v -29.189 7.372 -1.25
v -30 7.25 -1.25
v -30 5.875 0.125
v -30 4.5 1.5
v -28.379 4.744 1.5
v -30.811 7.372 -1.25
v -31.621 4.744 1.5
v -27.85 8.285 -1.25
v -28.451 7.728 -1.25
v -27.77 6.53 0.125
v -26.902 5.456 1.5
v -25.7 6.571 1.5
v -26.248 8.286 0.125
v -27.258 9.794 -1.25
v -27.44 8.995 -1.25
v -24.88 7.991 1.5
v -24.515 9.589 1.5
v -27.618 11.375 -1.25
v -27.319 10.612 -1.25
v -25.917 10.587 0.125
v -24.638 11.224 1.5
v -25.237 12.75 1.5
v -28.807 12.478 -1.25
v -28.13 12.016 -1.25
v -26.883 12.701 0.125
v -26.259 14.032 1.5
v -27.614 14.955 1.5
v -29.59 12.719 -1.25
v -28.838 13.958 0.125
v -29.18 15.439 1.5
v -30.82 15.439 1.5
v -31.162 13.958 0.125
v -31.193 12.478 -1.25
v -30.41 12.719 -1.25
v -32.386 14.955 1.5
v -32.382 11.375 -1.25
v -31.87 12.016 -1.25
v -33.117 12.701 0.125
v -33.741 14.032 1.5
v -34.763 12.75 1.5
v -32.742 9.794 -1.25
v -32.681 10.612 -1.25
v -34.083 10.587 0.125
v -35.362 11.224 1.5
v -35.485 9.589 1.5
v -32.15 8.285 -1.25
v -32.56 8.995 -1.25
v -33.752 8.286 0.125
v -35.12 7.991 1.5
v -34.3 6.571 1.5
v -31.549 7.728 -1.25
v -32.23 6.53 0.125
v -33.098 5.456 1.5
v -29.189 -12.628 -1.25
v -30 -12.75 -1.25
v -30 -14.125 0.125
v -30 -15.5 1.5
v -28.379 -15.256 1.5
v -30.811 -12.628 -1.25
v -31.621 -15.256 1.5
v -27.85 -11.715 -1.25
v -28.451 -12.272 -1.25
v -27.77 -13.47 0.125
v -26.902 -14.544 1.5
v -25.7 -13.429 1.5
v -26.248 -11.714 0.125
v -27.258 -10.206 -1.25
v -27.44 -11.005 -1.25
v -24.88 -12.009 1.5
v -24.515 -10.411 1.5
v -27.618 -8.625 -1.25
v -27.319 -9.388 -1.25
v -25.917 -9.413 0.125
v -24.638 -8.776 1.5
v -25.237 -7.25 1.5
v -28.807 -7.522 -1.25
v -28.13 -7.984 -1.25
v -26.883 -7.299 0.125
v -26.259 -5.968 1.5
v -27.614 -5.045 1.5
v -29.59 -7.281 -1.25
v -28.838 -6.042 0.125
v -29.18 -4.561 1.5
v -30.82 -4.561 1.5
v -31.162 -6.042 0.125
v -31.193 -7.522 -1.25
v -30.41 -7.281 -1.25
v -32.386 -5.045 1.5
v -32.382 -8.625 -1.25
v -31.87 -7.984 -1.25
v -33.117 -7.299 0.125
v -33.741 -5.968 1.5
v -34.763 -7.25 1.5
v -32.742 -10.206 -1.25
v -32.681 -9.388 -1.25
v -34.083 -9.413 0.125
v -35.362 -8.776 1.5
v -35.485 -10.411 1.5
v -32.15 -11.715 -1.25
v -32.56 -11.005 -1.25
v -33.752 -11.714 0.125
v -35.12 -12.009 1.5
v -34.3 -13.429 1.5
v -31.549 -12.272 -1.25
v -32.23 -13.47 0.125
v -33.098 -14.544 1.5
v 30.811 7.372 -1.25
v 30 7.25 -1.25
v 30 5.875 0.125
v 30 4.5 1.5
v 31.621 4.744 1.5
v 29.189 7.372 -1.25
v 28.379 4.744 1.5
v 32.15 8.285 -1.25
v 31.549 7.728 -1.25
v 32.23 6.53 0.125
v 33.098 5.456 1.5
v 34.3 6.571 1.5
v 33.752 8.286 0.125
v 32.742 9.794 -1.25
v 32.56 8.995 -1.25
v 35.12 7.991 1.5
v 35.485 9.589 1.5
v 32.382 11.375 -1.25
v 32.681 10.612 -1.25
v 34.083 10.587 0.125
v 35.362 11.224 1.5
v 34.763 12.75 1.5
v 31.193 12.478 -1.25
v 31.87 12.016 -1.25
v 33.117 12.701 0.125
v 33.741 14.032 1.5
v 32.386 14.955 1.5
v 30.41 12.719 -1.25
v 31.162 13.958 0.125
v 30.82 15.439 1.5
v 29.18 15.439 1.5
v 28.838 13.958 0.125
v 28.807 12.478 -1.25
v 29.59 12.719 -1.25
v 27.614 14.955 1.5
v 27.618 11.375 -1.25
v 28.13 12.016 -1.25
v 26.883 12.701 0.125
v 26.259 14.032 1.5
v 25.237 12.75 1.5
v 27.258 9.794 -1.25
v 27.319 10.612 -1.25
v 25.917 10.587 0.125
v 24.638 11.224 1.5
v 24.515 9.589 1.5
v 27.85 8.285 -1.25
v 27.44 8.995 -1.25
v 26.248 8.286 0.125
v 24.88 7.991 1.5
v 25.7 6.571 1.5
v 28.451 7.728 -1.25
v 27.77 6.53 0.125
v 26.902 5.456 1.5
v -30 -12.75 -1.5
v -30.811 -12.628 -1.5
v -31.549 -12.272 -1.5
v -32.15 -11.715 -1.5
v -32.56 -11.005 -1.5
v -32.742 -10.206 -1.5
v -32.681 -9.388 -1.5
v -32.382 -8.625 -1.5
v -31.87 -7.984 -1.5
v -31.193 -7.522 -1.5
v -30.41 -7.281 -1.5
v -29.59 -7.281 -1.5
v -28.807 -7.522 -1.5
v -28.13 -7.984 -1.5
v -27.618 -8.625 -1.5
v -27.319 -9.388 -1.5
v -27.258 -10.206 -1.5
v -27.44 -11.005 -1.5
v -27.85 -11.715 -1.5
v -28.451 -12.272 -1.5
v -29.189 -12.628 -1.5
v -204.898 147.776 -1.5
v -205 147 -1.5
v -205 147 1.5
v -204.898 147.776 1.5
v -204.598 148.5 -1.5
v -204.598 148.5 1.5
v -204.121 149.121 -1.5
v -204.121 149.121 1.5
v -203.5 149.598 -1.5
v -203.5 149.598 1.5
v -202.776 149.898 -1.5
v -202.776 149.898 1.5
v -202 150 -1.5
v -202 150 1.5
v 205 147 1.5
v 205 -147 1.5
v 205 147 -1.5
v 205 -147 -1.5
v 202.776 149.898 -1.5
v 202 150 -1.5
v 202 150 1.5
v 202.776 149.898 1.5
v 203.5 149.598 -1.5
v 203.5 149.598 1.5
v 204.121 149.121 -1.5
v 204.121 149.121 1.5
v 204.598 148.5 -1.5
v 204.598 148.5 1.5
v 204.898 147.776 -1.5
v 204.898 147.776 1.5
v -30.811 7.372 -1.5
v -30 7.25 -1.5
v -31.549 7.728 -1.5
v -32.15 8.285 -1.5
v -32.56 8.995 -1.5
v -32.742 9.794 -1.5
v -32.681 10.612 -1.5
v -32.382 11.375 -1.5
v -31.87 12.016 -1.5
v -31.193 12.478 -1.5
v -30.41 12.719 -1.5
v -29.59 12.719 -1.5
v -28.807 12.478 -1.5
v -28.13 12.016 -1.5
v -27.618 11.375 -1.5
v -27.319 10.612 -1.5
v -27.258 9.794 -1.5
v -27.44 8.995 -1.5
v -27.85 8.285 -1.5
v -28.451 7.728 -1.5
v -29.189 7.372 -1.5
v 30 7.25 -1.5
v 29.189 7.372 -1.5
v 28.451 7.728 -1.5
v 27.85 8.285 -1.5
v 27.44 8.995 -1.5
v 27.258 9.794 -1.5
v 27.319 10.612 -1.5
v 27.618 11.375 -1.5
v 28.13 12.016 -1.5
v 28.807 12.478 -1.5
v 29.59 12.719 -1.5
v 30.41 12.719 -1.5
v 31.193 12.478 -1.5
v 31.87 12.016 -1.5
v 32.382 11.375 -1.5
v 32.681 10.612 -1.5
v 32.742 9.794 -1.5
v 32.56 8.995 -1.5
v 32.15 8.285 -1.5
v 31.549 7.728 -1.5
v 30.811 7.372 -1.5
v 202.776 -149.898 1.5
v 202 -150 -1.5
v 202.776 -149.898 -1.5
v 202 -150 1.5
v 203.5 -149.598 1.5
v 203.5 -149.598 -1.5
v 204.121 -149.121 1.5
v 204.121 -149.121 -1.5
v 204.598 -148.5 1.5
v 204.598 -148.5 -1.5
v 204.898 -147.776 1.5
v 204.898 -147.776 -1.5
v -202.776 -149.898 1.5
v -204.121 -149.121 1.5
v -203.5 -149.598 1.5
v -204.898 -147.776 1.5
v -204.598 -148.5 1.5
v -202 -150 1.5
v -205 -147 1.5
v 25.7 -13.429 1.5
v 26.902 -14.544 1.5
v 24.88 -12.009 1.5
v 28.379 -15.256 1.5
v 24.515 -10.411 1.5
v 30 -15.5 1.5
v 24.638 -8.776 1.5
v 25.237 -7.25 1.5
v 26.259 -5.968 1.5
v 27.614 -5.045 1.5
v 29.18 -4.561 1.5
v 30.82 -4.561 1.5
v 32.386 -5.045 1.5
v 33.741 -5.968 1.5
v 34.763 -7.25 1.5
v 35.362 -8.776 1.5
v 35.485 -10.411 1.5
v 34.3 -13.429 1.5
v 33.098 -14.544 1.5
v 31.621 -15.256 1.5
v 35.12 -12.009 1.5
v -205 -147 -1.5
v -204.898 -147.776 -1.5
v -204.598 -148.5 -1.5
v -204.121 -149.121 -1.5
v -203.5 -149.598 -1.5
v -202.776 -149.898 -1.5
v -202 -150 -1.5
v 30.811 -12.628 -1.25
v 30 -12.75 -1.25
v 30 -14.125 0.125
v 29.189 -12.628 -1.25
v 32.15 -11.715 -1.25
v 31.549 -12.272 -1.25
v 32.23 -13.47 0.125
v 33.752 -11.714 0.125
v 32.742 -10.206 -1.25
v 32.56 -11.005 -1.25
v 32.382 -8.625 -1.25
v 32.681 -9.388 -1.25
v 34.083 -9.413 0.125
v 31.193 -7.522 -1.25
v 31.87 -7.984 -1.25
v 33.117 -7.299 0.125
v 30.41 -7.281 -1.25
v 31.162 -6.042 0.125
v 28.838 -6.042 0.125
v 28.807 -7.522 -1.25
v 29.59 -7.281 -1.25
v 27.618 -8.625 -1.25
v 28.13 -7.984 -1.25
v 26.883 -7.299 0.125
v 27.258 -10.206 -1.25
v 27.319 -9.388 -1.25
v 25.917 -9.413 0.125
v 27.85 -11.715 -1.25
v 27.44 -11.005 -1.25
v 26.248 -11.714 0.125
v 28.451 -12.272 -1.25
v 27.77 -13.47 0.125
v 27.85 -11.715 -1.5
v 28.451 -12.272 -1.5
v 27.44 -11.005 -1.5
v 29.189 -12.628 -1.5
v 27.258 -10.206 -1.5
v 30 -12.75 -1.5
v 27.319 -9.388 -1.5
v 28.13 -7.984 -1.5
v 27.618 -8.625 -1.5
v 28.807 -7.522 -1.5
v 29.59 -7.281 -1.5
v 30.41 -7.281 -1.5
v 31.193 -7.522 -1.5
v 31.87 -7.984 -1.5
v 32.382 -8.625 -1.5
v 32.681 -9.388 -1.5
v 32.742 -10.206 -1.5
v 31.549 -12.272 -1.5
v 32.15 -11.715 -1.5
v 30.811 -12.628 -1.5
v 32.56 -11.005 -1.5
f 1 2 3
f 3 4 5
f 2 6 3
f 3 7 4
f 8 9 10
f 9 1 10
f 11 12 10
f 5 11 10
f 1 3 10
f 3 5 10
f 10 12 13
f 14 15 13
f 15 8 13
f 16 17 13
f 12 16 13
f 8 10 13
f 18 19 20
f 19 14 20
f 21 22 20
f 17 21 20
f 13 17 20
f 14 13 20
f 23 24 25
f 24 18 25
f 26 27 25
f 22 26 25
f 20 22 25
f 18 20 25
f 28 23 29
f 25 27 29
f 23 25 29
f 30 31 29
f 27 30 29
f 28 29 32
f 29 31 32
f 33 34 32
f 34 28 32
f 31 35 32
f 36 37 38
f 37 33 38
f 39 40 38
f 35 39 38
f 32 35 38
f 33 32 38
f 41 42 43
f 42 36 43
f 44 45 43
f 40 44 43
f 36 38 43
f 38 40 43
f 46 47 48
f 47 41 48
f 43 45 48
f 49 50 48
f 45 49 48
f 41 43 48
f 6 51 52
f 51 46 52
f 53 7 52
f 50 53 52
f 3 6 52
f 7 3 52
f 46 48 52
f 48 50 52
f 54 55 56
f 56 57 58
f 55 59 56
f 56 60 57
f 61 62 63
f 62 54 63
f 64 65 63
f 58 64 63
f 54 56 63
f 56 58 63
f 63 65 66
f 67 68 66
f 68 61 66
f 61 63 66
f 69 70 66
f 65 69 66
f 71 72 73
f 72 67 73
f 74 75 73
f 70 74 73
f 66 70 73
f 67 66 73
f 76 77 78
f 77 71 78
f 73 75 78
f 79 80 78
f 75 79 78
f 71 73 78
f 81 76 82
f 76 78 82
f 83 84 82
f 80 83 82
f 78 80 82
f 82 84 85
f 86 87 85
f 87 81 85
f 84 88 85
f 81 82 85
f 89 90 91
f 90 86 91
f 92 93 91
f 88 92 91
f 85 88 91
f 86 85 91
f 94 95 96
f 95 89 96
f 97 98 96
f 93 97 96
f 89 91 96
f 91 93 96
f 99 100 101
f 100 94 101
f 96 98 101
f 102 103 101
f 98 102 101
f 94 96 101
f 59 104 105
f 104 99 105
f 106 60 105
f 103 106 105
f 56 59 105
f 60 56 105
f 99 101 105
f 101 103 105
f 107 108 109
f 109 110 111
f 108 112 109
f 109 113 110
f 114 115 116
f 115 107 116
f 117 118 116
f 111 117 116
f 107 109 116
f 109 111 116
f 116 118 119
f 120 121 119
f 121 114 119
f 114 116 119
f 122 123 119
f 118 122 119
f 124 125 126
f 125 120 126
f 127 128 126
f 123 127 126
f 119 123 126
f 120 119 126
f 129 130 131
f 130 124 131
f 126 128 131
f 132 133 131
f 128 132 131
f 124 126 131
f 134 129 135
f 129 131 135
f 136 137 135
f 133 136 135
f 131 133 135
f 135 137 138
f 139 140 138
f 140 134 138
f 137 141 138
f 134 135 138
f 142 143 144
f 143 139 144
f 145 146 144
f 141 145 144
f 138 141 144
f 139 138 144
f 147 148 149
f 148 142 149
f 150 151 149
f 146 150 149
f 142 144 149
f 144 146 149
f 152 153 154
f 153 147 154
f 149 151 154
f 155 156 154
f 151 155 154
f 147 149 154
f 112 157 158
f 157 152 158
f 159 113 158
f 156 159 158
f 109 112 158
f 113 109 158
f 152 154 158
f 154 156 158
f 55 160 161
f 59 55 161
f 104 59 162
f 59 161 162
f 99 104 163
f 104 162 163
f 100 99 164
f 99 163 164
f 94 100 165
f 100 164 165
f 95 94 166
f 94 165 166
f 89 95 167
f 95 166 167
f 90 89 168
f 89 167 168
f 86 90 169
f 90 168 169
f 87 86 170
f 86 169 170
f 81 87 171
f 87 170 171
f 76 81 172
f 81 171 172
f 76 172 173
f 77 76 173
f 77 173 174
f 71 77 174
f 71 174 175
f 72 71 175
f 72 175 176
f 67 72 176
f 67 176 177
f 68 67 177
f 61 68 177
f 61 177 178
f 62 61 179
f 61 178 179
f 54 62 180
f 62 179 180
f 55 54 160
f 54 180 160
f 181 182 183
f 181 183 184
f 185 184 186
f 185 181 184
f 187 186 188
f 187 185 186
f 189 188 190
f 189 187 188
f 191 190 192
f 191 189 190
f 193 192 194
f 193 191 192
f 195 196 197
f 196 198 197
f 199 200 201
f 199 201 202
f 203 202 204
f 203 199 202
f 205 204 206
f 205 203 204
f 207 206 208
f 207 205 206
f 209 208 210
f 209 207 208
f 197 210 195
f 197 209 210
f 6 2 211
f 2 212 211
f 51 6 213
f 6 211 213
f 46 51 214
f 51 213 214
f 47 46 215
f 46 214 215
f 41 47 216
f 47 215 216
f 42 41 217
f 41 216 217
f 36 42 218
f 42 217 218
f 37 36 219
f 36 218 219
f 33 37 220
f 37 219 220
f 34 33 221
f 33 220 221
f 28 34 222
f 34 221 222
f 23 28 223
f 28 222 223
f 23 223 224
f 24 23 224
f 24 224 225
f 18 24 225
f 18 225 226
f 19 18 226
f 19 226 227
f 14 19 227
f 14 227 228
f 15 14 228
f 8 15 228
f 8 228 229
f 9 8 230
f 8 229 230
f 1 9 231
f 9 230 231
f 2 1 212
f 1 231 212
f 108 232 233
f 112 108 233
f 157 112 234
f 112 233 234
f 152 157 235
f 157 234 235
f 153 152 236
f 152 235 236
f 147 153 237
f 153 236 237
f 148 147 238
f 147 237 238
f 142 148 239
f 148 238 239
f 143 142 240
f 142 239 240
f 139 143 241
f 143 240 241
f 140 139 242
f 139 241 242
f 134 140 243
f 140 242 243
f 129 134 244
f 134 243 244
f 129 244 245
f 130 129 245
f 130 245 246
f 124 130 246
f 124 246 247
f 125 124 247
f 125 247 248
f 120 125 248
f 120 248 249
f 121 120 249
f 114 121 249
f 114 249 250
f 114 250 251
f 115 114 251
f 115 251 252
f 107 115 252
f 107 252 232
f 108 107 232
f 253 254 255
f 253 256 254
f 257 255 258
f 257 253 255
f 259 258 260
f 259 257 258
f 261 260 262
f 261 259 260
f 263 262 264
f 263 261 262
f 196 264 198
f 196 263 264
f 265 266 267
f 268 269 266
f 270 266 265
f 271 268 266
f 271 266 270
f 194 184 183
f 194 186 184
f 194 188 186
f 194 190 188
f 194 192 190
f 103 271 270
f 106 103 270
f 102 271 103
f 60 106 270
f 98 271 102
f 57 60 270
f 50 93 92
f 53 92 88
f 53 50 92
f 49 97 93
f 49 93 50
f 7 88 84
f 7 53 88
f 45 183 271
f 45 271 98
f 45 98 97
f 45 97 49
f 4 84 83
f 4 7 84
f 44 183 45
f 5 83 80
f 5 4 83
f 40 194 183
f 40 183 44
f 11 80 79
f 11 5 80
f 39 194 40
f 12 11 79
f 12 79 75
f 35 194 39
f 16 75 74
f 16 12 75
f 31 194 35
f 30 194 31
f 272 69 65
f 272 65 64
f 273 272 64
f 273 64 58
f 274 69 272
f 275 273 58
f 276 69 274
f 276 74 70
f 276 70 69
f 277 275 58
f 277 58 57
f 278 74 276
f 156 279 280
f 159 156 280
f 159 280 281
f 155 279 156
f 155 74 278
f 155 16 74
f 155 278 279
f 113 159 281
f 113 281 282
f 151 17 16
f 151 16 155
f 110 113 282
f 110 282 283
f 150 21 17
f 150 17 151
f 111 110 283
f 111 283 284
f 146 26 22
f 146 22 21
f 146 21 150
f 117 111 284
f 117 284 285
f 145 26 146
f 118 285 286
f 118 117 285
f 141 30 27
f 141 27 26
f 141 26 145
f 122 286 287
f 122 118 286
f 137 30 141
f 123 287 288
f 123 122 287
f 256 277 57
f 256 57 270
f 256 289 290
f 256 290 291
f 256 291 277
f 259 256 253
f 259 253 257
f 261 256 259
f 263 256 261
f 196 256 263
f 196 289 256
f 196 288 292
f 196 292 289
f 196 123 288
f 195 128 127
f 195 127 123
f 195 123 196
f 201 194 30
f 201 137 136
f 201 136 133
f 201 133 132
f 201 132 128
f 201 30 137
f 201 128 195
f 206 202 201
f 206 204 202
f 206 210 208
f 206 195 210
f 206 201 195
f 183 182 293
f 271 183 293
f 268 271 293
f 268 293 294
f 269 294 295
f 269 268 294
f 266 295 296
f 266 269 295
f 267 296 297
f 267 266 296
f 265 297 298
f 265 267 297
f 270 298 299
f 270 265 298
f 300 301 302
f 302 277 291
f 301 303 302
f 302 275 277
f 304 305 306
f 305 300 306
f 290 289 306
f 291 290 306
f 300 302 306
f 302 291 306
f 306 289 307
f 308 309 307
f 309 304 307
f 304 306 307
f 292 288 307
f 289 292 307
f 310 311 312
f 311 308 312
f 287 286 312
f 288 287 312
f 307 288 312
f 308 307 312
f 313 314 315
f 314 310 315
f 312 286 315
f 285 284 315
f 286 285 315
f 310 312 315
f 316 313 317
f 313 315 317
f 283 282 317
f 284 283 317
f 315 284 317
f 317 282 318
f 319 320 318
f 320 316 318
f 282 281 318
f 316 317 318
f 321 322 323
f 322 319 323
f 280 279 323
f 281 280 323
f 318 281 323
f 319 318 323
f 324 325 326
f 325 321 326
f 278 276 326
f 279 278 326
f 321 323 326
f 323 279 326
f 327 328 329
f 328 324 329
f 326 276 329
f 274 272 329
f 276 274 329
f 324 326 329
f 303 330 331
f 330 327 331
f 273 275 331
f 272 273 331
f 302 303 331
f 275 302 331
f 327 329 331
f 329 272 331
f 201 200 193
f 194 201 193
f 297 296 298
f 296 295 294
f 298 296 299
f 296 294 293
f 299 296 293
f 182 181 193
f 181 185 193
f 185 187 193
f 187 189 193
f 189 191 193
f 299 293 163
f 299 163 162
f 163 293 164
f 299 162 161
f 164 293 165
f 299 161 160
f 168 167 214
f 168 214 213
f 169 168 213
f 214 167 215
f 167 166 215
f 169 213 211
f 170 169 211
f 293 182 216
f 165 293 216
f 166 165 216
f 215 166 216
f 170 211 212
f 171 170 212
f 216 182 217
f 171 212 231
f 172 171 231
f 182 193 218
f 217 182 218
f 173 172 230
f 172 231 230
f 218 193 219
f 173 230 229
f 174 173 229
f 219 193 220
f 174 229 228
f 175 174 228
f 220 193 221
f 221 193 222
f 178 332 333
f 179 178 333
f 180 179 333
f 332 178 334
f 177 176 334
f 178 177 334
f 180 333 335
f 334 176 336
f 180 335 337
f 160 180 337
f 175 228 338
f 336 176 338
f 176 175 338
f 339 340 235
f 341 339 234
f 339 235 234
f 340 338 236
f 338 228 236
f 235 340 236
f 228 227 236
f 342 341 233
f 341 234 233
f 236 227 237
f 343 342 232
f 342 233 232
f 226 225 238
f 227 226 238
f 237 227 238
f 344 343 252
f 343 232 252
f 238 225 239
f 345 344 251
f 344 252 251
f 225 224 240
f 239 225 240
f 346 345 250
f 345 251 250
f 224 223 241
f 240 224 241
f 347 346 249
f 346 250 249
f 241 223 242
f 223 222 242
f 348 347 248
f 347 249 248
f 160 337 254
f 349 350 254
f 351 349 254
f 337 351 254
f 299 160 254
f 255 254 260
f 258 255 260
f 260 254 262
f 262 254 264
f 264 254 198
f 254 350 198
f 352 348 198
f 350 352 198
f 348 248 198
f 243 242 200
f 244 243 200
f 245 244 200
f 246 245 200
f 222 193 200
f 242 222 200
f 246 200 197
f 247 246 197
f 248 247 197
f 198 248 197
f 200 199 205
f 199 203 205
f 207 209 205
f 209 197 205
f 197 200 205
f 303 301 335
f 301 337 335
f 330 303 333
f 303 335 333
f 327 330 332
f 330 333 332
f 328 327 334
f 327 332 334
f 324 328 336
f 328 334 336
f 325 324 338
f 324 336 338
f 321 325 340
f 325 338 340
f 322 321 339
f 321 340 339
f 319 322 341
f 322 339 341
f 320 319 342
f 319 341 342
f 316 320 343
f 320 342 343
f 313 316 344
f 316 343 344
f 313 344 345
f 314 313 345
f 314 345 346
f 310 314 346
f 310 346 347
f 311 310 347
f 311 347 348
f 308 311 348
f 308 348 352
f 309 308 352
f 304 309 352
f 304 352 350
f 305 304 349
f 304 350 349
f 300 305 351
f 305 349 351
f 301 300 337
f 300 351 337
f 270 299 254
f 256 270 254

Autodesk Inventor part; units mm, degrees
ref_plane "YZ Plane" through (0, 0, 0) normal (1, 0, 0) x (0, 1, 0)
ref_plane "XZ Plane" through (0, 0, 0) normal (0, 1, 0) x (-1, 0, 0)
ref_plane "XY Plane" through (0, 0, 0) normal (0, 0, 1) x (1, 0, 0)
sketch "Sketch1" plane through (0, 0, 0) normal (0, 0, 1) x (1, 0, 0)
  line L0 (-205, -150) -> (205, -150)
  line L1 (205, -150) -> (205, 150)
  line L2 (205, 150) -> (-205, 150)
  line L3 (-205, 150) -> (-205, -150)
  line L4 (-205, -150) -> (205, 150) construction
  line L5 (205, -150) -> (-205, 150) construction
  point P0 (0, 0)
  dimension "d0" = 410
  dimension "d1" = 300
extrude "Extrusion1" add sketch "Sketch1" along normal mid plane 3
sketch "Sketch5" plane through (0, 0, 1.5) normal (0, 0, 1) x (1, 0, 0)
  circle A0 centre (-30, 10) radius 2.1 projected
  circle A1 centre (-30, -10) radius 2.1 projected
  circle A2 centre (30, 10) radius 2.1 projected
  circle A3 centre (30, -10) radius 2.1 projected
  point P0 (0, 0)
hole "Hole2" at (-30, 10, 1.5) at (-30, -10, 1.5) at (30, 10, 1.5) at (30, -10, 1.5) direction (0, 0, -1) diameter 5.5 end through all countersink diameter 11 countersink angle 90 clearance for "Countersunk Flat Head Screw ISO 2009/7046" size "M5" standard "ISO"
fillet "Fillet2" radius 3 4 edges at (205, -150, 0) (205, 150, 0) (-205, 150, 0) (-205, -150, 0)
properties part number "PBLMK-041-1" material "Aluminum"
